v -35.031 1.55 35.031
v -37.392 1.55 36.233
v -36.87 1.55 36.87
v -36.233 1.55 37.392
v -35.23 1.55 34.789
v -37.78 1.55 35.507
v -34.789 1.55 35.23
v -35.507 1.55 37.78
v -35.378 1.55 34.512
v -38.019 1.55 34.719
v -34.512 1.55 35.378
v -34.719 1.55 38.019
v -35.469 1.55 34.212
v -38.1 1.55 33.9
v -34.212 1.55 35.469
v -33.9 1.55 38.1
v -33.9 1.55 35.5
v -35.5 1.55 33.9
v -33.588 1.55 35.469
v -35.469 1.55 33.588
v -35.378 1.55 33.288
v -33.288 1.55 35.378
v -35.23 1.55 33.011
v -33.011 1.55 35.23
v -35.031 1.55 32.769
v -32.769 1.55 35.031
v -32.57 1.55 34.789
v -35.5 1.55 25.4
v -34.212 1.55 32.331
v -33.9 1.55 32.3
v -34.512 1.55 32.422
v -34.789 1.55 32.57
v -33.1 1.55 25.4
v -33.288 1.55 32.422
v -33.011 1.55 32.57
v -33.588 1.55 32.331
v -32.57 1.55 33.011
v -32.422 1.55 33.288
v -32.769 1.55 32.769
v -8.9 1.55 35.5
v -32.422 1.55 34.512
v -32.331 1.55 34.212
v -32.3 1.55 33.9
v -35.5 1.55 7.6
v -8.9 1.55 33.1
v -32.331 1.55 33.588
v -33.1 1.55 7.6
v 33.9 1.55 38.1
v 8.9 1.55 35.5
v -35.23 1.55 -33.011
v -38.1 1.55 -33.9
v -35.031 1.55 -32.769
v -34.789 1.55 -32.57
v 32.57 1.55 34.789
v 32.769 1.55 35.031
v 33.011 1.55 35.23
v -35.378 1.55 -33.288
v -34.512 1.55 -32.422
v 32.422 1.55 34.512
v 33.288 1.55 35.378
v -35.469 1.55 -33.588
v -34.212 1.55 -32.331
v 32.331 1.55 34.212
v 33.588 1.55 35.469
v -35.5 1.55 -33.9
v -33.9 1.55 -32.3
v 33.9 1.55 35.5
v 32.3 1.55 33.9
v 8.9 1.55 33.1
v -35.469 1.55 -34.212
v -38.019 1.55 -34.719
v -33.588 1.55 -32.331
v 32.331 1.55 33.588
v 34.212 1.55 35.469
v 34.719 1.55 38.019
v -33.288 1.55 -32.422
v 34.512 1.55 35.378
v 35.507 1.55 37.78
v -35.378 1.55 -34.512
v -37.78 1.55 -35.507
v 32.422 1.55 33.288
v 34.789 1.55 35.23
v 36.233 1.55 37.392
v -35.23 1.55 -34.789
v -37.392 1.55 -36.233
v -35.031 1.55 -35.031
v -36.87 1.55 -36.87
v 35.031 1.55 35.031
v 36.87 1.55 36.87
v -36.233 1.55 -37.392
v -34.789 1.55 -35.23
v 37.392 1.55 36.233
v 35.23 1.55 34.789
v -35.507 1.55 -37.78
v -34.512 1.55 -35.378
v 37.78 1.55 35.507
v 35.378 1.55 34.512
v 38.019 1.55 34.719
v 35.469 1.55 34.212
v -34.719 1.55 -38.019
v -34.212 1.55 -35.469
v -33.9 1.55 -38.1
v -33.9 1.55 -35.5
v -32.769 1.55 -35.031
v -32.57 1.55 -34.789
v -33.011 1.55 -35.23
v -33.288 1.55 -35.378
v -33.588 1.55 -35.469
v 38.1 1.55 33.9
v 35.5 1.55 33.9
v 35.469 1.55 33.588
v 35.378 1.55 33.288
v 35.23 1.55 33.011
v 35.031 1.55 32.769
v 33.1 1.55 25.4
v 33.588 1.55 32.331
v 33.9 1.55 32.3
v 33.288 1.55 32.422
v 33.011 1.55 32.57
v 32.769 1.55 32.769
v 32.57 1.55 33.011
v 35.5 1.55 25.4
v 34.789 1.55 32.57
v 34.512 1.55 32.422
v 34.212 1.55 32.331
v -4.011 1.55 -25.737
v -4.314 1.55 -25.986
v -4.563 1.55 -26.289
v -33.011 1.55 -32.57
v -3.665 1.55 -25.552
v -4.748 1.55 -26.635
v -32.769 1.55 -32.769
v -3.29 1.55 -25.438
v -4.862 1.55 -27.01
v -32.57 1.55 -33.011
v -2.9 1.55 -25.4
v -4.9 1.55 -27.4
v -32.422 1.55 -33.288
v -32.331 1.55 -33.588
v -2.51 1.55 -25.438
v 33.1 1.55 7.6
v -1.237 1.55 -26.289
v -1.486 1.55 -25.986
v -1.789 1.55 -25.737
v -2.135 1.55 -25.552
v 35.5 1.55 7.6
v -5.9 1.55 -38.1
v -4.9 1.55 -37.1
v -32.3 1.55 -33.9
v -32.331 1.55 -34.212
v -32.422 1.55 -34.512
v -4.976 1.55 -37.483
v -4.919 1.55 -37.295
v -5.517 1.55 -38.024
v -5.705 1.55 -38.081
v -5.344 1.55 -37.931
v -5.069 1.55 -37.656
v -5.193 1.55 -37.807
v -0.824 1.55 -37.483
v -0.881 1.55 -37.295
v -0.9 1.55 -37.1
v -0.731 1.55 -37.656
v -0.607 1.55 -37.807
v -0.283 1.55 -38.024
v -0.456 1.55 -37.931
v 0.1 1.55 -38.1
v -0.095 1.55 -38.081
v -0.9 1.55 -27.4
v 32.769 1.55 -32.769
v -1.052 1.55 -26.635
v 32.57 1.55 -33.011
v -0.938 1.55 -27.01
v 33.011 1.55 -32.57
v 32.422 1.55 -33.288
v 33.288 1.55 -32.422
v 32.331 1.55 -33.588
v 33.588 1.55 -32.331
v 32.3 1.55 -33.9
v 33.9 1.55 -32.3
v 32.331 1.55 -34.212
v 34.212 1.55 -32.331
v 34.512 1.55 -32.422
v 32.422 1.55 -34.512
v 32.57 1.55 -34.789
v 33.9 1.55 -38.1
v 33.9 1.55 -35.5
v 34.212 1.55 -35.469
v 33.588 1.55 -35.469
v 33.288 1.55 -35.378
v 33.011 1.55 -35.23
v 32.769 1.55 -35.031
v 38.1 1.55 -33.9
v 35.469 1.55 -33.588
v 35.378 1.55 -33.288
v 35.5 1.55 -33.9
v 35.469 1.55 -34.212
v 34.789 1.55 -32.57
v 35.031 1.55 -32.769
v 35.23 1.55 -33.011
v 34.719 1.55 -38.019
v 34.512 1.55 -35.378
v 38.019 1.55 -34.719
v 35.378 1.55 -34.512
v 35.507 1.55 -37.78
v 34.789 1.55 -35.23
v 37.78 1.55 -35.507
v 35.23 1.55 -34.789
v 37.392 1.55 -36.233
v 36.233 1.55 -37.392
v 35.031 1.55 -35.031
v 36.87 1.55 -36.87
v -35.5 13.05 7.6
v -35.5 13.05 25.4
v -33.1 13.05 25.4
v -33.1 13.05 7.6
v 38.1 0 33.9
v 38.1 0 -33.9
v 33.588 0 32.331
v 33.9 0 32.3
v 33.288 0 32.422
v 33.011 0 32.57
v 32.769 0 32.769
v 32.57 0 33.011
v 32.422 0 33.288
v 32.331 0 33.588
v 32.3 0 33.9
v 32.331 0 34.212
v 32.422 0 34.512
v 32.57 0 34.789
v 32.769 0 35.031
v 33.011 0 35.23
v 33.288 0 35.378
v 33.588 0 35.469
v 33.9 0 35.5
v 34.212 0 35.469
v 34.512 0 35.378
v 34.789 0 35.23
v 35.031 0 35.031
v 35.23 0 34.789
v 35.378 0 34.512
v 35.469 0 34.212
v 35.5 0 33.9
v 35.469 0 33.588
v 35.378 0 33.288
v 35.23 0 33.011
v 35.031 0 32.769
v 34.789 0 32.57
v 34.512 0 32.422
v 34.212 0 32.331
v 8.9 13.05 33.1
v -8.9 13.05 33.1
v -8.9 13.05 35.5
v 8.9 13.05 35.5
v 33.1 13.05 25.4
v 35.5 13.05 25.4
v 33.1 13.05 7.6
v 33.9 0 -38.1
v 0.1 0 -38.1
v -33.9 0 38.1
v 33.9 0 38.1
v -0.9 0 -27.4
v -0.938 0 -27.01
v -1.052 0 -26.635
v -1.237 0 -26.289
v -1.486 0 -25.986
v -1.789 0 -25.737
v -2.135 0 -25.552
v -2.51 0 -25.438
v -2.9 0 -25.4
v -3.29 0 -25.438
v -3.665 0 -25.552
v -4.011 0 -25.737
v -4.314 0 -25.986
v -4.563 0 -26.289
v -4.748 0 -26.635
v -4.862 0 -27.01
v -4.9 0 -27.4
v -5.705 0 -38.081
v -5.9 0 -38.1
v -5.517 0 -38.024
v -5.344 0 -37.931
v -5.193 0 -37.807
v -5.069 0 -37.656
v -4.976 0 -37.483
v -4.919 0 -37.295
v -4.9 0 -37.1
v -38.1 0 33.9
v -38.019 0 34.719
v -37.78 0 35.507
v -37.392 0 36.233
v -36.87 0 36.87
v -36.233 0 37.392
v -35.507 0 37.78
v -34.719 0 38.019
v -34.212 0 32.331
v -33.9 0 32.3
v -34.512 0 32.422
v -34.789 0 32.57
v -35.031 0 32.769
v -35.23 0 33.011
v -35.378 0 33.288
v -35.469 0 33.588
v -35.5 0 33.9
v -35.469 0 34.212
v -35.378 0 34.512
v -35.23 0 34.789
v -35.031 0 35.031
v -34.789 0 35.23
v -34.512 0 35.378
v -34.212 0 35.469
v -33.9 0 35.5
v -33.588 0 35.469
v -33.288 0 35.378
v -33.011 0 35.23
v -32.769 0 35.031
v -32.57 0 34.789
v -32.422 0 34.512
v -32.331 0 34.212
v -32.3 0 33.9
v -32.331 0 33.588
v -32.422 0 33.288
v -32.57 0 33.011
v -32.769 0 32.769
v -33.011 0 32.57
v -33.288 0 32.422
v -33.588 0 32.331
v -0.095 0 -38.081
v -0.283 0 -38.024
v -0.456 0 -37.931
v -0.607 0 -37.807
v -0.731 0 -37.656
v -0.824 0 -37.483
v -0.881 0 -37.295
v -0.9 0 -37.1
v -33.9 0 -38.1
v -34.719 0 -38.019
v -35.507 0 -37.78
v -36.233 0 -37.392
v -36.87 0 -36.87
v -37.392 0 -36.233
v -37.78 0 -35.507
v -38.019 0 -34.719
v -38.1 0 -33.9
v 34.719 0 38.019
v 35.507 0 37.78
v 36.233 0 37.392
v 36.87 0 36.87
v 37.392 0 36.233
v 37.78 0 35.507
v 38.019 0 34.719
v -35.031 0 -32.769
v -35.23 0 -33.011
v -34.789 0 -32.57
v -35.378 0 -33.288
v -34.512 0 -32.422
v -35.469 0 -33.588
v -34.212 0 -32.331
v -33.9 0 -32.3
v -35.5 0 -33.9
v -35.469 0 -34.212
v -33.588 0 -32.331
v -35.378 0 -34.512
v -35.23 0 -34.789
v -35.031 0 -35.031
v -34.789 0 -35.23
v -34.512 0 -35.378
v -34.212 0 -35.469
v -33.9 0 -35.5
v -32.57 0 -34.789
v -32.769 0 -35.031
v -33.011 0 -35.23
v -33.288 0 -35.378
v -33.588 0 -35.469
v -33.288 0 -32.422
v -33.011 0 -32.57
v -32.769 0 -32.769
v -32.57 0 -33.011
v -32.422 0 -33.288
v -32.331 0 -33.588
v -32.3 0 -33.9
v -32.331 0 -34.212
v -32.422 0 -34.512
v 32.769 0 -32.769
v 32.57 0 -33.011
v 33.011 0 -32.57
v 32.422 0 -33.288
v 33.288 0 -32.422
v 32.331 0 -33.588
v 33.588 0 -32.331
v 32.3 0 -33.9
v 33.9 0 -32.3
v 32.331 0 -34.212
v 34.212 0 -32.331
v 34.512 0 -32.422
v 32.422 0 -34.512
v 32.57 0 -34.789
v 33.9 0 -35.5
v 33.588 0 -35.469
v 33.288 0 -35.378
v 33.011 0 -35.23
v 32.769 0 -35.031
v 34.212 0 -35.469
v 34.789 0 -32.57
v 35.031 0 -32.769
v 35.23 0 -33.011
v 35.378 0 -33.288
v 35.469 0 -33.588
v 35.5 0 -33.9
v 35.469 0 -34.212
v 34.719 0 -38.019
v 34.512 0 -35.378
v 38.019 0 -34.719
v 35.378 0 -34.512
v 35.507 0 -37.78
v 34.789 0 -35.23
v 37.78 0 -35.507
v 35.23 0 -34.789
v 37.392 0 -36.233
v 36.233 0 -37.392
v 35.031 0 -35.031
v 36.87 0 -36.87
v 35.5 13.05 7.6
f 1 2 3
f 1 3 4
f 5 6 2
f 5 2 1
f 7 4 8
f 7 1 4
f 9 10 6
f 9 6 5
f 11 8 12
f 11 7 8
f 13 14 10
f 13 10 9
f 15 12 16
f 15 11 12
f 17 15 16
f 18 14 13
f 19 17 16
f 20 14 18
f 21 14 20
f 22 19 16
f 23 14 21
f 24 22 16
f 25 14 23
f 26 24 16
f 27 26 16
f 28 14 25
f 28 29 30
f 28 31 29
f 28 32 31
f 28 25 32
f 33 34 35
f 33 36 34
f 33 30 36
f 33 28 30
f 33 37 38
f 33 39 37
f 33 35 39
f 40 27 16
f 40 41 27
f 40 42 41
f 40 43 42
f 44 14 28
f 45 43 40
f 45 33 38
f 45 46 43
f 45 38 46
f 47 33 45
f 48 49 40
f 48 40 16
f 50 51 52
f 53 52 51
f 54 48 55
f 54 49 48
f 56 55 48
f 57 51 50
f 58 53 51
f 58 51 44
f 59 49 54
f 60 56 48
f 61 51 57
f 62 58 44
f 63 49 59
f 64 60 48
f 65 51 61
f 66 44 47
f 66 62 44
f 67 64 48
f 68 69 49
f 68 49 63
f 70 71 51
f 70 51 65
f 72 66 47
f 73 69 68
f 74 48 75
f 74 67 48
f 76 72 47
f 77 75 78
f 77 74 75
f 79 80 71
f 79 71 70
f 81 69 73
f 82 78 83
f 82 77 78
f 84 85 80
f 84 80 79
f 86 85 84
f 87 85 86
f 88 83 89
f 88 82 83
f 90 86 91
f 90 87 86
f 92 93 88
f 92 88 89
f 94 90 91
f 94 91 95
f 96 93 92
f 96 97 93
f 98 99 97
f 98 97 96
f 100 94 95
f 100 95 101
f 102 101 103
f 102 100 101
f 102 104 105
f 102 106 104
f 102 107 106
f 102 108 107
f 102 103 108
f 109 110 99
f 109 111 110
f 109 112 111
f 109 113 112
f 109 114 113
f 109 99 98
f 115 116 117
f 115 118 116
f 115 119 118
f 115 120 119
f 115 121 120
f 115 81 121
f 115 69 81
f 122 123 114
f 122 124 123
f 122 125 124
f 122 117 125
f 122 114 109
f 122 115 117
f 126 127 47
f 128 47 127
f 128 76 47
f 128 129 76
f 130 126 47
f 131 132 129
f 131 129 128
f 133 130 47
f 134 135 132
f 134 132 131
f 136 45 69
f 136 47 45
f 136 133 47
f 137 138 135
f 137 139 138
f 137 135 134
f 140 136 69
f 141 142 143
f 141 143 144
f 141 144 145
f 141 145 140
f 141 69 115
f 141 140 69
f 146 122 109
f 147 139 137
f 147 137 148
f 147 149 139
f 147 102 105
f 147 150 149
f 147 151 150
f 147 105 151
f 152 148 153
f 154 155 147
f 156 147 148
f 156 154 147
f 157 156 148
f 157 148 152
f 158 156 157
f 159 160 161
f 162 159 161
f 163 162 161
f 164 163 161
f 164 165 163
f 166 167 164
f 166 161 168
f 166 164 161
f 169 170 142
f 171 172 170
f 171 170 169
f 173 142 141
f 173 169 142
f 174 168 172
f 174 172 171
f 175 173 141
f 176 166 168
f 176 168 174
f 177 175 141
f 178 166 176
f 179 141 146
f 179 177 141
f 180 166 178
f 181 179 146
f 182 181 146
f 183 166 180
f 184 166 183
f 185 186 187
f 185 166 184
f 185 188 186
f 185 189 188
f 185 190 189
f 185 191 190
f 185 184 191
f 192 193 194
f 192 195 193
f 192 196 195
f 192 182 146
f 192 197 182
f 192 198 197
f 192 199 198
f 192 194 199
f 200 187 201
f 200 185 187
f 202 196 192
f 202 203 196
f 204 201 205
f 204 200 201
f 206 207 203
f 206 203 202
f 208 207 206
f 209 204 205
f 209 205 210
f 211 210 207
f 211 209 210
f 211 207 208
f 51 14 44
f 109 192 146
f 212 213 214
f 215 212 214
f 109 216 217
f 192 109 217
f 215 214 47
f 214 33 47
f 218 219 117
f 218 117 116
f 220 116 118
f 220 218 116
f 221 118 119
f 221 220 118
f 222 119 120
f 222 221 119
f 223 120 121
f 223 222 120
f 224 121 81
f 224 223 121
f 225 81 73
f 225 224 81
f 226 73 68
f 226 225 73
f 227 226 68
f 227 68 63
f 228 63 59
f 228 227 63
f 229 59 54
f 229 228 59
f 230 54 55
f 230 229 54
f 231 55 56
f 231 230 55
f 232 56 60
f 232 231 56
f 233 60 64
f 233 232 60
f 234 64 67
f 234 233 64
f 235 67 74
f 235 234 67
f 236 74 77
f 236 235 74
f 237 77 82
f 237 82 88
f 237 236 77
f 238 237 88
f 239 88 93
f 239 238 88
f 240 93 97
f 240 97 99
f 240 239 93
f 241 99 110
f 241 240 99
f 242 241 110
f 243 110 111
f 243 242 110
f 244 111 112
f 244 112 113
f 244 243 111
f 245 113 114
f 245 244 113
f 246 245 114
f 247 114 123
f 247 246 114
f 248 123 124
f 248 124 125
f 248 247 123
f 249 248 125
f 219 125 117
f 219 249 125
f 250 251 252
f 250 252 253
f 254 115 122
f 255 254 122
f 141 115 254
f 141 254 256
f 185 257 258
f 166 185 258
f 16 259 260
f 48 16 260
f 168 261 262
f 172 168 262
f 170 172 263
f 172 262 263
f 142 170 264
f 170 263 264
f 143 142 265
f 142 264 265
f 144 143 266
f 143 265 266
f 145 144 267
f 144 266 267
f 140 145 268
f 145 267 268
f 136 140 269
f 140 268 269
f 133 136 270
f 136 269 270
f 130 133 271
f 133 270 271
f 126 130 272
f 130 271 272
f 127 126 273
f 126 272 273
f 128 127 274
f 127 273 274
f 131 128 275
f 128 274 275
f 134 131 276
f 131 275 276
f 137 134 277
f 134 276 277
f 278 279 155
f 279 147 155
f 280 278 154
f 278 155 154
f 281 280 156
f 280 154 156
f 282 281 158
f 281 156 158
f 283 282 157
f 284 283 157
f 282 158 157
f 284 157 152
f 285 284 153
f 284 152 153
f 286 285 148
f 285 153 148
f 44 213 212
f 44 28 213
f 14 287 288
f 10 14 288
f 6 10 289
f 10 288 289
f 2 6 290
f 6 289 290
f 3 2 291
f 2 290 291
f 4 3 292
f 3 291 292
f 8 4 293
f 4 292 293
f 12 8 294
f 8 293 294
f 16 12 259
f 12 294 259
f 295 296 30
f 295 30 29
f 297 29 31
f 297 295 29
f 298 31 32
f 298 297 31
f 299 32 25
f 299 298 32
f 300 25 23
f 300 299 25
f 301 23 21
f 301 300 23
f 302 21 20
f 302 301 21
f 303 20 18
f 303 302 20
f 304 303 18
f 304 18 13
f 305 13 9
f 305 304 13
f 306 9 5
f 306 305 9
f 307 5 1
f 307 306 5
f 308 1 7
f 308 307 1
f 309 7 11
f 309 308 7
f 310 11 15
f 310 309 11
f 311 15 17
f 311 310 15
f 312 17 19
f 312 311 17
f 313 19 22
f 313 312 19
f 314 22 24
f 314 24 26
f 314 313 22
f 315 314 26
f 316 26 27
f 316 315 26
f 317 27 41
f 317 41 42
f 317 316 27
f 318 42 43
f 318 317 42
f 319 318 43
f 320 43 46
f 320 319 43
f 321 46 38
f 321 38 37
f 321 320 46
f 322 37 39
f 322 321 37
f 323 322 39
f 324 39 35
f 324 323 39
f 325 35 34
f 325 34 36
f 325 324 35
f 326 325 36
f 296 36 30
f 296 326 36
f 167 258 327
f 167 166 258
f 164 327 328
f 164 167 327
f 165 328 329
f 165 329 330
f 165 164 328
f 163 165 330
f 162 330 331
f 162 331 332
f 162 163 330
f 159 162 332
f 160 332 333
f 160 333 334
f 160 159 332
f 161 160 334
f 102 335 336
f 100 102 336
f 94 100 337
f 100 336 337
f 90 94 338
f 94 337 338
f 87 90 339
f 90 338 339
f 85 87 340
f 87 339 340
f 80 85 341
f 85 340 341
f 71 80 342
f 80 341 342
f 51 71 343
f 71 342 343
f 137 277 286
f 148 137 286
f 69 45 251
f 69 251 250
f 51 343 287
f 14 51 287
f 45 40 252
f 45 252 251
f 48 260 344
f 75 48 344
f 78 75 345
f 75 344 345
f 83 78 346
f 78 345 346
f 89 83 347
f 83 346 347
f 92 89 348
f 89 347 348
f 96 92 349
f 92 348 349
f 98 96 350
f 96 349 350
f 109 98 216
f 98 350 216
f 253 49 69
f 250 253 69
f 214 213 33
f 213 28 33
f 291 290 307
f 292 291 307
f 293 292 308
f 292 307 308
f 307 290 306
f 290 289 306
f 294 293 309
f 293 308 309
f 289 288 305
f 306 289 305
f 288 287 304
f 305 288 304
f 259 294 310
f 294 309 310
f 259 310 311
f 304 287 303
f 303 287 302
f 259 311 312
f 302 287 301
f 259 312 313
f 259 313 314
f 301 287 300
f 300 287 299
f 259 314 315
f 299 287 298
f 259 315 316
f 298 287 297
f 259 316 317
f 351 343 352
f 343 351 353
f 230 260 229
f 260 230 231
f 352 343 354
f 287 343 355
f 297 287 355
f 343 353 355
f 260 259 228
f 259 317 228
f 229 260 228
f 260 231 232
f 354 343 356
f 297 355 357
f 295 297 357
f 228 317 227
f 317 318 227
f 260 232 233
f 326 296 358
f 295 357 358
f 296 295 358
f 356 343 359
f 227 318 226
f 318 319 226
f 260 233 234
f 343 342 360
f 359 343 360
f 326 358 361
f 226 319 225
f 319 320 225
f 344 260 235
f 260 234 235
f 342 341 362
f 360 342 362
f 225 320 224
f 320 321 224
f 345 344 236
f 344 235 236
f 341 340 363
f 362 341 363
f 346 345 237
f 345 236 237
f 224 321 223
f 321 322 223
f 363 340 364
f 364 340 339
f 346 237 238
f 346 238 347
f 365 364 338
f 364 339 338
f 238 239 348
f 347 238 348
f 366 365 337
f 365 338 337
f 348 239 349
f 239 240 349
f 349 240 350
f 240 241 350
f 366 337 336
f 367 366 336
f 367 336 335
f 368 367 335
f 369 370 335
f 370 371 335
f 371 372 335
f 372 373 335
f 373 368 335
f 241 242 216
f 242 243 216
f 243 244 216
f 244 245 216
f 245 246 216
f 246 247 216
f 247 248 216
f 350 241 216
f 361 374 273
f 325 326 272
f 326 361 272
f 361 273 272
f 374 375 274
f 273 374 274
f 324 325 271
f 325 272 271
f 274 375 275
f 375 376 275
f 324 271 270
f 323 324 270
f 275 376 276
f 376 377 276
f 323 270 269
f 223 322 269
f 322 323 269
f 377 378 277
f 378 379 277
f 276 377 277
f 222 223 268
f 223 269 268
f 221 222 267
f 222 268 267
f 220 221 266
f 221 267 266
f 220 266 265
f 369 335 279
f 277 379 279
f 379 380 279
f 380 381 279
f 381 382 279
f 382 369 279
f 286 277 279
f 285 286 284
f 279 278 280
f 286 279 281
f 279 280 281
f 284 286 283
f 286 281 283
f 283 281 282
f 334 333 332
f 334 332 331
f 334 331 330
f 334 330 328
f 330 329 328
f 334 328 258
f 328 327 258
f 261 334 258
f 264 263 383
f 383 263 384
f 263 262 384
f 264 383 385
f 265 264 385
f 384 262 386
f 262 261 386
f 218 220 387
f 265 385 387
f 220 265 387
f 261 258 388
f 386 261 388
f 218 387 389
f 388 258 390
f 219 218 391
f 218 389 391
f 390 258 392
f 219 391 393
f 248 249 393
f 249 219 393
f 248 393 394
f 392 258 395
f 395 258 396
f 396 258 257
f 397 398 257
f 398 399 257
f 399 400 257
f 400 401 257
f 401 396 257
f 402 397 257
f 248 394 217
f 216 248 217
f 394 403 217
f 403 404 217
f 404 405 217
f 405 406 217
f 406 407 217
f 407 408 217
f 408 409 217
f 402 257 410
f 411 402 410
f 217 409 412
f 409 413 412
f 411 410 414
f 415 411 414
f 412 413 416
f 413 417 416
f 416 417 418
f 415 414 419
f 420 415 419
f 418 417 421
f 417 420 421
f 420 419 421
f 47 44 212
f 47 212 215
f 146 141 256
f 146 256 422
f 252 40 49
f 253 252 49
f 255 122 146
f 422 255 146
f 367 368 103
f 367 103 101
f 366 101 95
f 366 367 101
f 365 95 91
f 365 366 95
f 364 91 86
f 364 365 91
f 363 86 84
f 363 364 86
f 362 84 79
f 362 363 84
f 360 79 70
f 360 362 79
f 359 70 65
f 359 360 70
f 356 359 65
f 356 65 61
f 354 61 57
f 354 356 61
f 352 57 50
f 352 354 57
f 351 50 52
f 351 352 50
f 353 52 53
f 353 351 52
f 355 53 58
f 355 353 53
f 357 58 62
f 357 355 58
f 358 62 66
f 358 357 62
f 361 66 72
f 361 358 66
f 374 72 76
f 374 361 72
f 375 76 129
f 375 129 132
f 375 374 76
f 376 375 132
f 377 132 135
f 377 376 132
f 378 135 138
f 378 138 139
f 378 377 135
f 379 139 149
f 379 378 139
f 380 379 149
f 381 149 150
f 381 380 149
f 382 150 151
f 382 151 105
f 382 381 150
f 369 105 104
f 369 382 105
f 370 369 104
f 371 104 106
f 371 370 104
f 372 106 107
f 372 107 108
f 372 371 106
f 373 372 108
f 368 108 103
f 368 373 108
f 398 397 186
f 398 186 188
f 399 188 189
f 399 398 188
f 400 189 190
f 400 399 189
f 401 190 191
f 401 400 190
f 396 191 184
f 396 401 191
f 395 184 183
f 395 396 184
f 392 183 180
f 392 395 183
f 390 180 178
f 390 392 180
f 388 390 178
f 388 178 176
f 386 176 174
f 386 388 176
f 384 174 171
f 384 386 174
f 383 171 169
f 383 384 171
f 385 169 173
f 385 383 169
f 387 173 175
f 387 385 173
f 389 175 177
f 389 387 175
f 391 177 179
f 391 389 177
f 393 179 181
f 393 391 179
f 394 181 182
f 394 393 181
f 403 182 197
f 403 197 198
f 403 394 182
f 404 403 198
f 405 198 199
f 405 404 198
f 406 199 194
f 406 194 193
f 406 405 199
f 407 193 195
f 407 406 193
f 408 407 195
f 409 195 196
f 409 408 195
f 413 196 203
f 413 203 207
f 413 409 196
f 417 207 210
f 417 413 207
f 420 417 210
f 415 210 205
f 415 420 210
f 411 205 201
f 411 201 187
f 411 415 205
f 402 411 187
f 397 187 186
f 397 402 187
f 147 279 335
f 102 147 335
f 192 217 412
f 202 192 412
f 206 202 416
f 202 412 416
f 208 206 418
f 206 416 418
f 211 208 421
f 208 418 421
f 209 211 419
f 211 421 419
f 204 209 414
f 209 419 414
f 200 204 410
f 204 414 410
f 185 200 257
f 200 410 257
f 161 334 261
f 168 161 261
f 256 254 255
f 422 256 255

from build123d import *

# Parameters (mm, degrees)
BASE_PLATE_R            = 1.6
PCB_DEPTH               = 1.55
FILLET_1_R              = 1
SKETCH_2_W              = 2.4
SKETCH_2_H              = 17.8
SKETCH_2_W_2            = 17.8
SKETCH_2_H_2            = 2.4
LIDAR_PINS_DEPTH        = 8.5
SKETCH_3_W              = 2.4
SKETCH_3_H              = 17.8
SKETCH_3_W_2            = 17.8
SKETCH_3_H_2            = 2.4
LIDAR_PIN_HEADERS_DEPTH = 3


with BuildPart() as part:
    # Base plate → PCB (new body)
    with BuildSketch(Plane(origin=(0, 0, 0), x_dir=(1, 0, 0), z_dir=(0, 1, 0))):
        with BuildLine():
            ThreePointArc((-38.1, -33.9), (-36.869848481, -36.869848481), (-33.9, -38.1))
            Line((-33.9, -38.1), (33.9, -38.1))
            ThreePointArc((33.9, -38.1), (36.869848481, -36.869848481), (38.1, -33.9))
            Line((38.1, -33.9), (38.1, 33.9))
            ThreePointArc((38.1, 33.9), (36.869848481, 36.869848481), (33.9, 38.1))
            Line((33.9, 38.1), (-0.9, 38.1))
            Line((-0.9, 38.1), (-0.9, 27.4))
            ThreePointArc((-0.9, 27.4), (-2.9, 25.4), (-4.9, 27.4))
            Line((-4.9, 27.4), (-4.9, 38.1))
            Line((-4.9, 38.1), (-33.9, 38.1))
            ThreePointArc((-33.9, 38.1), (-36.869848481, 36.869848481), (-38.1, 33.9))
            Line((-38.1, 33.9), (-38.1, -33.9))
        make_face()
        with Locations(Location((-33.9, -33.9, 0), (0, 0, 90))):
            Circle(BASE_PLATE_R, mode=Mode.SUBTRACT)
        with Locations(Location((33.9, -33.9, 0), (0, 0, 90))):
            Circle(BASE_PLATE_R, mode=Mode.SUBTRACT)
        with Locations(Location((-33.9, 33.9, 0), (0, 0, 90))):
            Circle(BASE_PLATE_R, mode=Mode.SUBTRACT)
        with Locations(Location((33.9, 33.9, 0), (0, 0, 90))):
            Circle(BASE_PLATE_R, mode=Mode.SUBTRACT)
    extrude(amount=PCB_DEPTH)

    # 圆角1
    fillet_1_edges = [part.edges().sort_by_distance(p)[0] for p in [
        (-0.9, 0.775, -38.1),
        (-4.9, 0.775, -38.1),
    ]]
    fillet(fillet_1_edges, radius=FILLET_1_R)

    # 草图2 → Lidar pins (add)
    with BuildSketch(Plane(origin=(0, 1.55, 0), x_dir=(1, 0, 0), z_dir=(0, 1, 0))):
        with Locations((-34.3, -16.5)):
            Rectangle(SKETCH_2_W, SKETCH_2_H)
        with Locations((34.3, -16.5)):
            Rectangle(SKETCH_2_W, SKETCH_2_H)
        with Locations((0, -34.3)):
            Rectangle(SKETCH_2_W_2, SKETCH_2_H_2)
    extrude(amount=LIDAR_PINS_DEPTH)

    # 草图3 → Lidar pin headers (add)
    with BuildSketch(Plane(origin=(0, 10.05, 0), x_dir=(1, 0, 0), z_dir=(0, 1, 0))):
        with Locations((-34.3, -16.5)):
            Rectangle(SKETCH_3_W, SKETCH_3_H)
        with Locations((0, -34.3)):
            Rectangle(SKETCH_3_W_2, SKETCH_3_H_2)
        with Locations((34.3, -16.5)):
            Rectangle(SKETCH_3_W, SKETCH_3_H)
    extrude(amount=LIDAR_PIN_HEADERS_DEPTH)


solid = part.part
